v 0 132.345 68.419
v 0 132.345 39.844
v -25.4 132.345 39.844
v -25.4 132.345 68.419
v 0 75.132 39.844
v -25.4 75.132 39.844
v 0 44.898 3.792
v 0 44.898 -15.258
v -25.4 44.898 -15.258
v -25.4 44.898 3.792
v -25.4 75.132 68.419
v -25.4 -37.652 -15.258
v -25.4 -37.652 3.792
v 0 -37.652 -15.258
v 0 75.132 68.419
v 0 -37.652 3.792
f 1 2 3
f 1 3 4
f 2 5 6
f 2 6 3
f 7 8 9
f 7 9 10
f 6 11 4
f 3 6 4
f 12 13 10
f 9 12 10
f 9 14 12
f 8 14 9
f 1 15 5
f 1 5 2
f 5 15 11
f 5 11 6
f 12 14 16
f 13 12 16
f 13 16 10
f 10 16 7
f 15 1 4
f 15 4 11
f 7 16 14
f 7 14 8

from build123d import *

# Parameters (mm, degrees)
F0_W     = 82.55
F0_H     = 19.05
F1_DEPTH = 25.4


# Not quite as in the source:
# - the program builds the solid bodies; features that only make, move or delete a surface that nothing else refers to are left out


with BuildPart() as f1:
    # F0 (on Right) → F1 (new body)
    with BuildSketch(Plane.YZ):
        with Locations((3.6226294778, -5.7332926338)):
            Rectangle(F0_W, F0_H)
    extrude(amount=-F1_DEPTH)


with BuildPart() as f1b:
    # F0 (on Right) → F1, piece 2 (new body)
    with BuildSketch(Plane.YZ):
        Polygon((75.1320355881, 68.4194193109), (75.1320355881, 49.7785689481), (75.1320355881, 39.8444193109), (132.3449026117, 39.8444193109), (132.3449026117, 68.4194193109), align=None)
    extrude(amount=-F1_DEPTH)


solid = Compound([f1.part, f1b.part])
